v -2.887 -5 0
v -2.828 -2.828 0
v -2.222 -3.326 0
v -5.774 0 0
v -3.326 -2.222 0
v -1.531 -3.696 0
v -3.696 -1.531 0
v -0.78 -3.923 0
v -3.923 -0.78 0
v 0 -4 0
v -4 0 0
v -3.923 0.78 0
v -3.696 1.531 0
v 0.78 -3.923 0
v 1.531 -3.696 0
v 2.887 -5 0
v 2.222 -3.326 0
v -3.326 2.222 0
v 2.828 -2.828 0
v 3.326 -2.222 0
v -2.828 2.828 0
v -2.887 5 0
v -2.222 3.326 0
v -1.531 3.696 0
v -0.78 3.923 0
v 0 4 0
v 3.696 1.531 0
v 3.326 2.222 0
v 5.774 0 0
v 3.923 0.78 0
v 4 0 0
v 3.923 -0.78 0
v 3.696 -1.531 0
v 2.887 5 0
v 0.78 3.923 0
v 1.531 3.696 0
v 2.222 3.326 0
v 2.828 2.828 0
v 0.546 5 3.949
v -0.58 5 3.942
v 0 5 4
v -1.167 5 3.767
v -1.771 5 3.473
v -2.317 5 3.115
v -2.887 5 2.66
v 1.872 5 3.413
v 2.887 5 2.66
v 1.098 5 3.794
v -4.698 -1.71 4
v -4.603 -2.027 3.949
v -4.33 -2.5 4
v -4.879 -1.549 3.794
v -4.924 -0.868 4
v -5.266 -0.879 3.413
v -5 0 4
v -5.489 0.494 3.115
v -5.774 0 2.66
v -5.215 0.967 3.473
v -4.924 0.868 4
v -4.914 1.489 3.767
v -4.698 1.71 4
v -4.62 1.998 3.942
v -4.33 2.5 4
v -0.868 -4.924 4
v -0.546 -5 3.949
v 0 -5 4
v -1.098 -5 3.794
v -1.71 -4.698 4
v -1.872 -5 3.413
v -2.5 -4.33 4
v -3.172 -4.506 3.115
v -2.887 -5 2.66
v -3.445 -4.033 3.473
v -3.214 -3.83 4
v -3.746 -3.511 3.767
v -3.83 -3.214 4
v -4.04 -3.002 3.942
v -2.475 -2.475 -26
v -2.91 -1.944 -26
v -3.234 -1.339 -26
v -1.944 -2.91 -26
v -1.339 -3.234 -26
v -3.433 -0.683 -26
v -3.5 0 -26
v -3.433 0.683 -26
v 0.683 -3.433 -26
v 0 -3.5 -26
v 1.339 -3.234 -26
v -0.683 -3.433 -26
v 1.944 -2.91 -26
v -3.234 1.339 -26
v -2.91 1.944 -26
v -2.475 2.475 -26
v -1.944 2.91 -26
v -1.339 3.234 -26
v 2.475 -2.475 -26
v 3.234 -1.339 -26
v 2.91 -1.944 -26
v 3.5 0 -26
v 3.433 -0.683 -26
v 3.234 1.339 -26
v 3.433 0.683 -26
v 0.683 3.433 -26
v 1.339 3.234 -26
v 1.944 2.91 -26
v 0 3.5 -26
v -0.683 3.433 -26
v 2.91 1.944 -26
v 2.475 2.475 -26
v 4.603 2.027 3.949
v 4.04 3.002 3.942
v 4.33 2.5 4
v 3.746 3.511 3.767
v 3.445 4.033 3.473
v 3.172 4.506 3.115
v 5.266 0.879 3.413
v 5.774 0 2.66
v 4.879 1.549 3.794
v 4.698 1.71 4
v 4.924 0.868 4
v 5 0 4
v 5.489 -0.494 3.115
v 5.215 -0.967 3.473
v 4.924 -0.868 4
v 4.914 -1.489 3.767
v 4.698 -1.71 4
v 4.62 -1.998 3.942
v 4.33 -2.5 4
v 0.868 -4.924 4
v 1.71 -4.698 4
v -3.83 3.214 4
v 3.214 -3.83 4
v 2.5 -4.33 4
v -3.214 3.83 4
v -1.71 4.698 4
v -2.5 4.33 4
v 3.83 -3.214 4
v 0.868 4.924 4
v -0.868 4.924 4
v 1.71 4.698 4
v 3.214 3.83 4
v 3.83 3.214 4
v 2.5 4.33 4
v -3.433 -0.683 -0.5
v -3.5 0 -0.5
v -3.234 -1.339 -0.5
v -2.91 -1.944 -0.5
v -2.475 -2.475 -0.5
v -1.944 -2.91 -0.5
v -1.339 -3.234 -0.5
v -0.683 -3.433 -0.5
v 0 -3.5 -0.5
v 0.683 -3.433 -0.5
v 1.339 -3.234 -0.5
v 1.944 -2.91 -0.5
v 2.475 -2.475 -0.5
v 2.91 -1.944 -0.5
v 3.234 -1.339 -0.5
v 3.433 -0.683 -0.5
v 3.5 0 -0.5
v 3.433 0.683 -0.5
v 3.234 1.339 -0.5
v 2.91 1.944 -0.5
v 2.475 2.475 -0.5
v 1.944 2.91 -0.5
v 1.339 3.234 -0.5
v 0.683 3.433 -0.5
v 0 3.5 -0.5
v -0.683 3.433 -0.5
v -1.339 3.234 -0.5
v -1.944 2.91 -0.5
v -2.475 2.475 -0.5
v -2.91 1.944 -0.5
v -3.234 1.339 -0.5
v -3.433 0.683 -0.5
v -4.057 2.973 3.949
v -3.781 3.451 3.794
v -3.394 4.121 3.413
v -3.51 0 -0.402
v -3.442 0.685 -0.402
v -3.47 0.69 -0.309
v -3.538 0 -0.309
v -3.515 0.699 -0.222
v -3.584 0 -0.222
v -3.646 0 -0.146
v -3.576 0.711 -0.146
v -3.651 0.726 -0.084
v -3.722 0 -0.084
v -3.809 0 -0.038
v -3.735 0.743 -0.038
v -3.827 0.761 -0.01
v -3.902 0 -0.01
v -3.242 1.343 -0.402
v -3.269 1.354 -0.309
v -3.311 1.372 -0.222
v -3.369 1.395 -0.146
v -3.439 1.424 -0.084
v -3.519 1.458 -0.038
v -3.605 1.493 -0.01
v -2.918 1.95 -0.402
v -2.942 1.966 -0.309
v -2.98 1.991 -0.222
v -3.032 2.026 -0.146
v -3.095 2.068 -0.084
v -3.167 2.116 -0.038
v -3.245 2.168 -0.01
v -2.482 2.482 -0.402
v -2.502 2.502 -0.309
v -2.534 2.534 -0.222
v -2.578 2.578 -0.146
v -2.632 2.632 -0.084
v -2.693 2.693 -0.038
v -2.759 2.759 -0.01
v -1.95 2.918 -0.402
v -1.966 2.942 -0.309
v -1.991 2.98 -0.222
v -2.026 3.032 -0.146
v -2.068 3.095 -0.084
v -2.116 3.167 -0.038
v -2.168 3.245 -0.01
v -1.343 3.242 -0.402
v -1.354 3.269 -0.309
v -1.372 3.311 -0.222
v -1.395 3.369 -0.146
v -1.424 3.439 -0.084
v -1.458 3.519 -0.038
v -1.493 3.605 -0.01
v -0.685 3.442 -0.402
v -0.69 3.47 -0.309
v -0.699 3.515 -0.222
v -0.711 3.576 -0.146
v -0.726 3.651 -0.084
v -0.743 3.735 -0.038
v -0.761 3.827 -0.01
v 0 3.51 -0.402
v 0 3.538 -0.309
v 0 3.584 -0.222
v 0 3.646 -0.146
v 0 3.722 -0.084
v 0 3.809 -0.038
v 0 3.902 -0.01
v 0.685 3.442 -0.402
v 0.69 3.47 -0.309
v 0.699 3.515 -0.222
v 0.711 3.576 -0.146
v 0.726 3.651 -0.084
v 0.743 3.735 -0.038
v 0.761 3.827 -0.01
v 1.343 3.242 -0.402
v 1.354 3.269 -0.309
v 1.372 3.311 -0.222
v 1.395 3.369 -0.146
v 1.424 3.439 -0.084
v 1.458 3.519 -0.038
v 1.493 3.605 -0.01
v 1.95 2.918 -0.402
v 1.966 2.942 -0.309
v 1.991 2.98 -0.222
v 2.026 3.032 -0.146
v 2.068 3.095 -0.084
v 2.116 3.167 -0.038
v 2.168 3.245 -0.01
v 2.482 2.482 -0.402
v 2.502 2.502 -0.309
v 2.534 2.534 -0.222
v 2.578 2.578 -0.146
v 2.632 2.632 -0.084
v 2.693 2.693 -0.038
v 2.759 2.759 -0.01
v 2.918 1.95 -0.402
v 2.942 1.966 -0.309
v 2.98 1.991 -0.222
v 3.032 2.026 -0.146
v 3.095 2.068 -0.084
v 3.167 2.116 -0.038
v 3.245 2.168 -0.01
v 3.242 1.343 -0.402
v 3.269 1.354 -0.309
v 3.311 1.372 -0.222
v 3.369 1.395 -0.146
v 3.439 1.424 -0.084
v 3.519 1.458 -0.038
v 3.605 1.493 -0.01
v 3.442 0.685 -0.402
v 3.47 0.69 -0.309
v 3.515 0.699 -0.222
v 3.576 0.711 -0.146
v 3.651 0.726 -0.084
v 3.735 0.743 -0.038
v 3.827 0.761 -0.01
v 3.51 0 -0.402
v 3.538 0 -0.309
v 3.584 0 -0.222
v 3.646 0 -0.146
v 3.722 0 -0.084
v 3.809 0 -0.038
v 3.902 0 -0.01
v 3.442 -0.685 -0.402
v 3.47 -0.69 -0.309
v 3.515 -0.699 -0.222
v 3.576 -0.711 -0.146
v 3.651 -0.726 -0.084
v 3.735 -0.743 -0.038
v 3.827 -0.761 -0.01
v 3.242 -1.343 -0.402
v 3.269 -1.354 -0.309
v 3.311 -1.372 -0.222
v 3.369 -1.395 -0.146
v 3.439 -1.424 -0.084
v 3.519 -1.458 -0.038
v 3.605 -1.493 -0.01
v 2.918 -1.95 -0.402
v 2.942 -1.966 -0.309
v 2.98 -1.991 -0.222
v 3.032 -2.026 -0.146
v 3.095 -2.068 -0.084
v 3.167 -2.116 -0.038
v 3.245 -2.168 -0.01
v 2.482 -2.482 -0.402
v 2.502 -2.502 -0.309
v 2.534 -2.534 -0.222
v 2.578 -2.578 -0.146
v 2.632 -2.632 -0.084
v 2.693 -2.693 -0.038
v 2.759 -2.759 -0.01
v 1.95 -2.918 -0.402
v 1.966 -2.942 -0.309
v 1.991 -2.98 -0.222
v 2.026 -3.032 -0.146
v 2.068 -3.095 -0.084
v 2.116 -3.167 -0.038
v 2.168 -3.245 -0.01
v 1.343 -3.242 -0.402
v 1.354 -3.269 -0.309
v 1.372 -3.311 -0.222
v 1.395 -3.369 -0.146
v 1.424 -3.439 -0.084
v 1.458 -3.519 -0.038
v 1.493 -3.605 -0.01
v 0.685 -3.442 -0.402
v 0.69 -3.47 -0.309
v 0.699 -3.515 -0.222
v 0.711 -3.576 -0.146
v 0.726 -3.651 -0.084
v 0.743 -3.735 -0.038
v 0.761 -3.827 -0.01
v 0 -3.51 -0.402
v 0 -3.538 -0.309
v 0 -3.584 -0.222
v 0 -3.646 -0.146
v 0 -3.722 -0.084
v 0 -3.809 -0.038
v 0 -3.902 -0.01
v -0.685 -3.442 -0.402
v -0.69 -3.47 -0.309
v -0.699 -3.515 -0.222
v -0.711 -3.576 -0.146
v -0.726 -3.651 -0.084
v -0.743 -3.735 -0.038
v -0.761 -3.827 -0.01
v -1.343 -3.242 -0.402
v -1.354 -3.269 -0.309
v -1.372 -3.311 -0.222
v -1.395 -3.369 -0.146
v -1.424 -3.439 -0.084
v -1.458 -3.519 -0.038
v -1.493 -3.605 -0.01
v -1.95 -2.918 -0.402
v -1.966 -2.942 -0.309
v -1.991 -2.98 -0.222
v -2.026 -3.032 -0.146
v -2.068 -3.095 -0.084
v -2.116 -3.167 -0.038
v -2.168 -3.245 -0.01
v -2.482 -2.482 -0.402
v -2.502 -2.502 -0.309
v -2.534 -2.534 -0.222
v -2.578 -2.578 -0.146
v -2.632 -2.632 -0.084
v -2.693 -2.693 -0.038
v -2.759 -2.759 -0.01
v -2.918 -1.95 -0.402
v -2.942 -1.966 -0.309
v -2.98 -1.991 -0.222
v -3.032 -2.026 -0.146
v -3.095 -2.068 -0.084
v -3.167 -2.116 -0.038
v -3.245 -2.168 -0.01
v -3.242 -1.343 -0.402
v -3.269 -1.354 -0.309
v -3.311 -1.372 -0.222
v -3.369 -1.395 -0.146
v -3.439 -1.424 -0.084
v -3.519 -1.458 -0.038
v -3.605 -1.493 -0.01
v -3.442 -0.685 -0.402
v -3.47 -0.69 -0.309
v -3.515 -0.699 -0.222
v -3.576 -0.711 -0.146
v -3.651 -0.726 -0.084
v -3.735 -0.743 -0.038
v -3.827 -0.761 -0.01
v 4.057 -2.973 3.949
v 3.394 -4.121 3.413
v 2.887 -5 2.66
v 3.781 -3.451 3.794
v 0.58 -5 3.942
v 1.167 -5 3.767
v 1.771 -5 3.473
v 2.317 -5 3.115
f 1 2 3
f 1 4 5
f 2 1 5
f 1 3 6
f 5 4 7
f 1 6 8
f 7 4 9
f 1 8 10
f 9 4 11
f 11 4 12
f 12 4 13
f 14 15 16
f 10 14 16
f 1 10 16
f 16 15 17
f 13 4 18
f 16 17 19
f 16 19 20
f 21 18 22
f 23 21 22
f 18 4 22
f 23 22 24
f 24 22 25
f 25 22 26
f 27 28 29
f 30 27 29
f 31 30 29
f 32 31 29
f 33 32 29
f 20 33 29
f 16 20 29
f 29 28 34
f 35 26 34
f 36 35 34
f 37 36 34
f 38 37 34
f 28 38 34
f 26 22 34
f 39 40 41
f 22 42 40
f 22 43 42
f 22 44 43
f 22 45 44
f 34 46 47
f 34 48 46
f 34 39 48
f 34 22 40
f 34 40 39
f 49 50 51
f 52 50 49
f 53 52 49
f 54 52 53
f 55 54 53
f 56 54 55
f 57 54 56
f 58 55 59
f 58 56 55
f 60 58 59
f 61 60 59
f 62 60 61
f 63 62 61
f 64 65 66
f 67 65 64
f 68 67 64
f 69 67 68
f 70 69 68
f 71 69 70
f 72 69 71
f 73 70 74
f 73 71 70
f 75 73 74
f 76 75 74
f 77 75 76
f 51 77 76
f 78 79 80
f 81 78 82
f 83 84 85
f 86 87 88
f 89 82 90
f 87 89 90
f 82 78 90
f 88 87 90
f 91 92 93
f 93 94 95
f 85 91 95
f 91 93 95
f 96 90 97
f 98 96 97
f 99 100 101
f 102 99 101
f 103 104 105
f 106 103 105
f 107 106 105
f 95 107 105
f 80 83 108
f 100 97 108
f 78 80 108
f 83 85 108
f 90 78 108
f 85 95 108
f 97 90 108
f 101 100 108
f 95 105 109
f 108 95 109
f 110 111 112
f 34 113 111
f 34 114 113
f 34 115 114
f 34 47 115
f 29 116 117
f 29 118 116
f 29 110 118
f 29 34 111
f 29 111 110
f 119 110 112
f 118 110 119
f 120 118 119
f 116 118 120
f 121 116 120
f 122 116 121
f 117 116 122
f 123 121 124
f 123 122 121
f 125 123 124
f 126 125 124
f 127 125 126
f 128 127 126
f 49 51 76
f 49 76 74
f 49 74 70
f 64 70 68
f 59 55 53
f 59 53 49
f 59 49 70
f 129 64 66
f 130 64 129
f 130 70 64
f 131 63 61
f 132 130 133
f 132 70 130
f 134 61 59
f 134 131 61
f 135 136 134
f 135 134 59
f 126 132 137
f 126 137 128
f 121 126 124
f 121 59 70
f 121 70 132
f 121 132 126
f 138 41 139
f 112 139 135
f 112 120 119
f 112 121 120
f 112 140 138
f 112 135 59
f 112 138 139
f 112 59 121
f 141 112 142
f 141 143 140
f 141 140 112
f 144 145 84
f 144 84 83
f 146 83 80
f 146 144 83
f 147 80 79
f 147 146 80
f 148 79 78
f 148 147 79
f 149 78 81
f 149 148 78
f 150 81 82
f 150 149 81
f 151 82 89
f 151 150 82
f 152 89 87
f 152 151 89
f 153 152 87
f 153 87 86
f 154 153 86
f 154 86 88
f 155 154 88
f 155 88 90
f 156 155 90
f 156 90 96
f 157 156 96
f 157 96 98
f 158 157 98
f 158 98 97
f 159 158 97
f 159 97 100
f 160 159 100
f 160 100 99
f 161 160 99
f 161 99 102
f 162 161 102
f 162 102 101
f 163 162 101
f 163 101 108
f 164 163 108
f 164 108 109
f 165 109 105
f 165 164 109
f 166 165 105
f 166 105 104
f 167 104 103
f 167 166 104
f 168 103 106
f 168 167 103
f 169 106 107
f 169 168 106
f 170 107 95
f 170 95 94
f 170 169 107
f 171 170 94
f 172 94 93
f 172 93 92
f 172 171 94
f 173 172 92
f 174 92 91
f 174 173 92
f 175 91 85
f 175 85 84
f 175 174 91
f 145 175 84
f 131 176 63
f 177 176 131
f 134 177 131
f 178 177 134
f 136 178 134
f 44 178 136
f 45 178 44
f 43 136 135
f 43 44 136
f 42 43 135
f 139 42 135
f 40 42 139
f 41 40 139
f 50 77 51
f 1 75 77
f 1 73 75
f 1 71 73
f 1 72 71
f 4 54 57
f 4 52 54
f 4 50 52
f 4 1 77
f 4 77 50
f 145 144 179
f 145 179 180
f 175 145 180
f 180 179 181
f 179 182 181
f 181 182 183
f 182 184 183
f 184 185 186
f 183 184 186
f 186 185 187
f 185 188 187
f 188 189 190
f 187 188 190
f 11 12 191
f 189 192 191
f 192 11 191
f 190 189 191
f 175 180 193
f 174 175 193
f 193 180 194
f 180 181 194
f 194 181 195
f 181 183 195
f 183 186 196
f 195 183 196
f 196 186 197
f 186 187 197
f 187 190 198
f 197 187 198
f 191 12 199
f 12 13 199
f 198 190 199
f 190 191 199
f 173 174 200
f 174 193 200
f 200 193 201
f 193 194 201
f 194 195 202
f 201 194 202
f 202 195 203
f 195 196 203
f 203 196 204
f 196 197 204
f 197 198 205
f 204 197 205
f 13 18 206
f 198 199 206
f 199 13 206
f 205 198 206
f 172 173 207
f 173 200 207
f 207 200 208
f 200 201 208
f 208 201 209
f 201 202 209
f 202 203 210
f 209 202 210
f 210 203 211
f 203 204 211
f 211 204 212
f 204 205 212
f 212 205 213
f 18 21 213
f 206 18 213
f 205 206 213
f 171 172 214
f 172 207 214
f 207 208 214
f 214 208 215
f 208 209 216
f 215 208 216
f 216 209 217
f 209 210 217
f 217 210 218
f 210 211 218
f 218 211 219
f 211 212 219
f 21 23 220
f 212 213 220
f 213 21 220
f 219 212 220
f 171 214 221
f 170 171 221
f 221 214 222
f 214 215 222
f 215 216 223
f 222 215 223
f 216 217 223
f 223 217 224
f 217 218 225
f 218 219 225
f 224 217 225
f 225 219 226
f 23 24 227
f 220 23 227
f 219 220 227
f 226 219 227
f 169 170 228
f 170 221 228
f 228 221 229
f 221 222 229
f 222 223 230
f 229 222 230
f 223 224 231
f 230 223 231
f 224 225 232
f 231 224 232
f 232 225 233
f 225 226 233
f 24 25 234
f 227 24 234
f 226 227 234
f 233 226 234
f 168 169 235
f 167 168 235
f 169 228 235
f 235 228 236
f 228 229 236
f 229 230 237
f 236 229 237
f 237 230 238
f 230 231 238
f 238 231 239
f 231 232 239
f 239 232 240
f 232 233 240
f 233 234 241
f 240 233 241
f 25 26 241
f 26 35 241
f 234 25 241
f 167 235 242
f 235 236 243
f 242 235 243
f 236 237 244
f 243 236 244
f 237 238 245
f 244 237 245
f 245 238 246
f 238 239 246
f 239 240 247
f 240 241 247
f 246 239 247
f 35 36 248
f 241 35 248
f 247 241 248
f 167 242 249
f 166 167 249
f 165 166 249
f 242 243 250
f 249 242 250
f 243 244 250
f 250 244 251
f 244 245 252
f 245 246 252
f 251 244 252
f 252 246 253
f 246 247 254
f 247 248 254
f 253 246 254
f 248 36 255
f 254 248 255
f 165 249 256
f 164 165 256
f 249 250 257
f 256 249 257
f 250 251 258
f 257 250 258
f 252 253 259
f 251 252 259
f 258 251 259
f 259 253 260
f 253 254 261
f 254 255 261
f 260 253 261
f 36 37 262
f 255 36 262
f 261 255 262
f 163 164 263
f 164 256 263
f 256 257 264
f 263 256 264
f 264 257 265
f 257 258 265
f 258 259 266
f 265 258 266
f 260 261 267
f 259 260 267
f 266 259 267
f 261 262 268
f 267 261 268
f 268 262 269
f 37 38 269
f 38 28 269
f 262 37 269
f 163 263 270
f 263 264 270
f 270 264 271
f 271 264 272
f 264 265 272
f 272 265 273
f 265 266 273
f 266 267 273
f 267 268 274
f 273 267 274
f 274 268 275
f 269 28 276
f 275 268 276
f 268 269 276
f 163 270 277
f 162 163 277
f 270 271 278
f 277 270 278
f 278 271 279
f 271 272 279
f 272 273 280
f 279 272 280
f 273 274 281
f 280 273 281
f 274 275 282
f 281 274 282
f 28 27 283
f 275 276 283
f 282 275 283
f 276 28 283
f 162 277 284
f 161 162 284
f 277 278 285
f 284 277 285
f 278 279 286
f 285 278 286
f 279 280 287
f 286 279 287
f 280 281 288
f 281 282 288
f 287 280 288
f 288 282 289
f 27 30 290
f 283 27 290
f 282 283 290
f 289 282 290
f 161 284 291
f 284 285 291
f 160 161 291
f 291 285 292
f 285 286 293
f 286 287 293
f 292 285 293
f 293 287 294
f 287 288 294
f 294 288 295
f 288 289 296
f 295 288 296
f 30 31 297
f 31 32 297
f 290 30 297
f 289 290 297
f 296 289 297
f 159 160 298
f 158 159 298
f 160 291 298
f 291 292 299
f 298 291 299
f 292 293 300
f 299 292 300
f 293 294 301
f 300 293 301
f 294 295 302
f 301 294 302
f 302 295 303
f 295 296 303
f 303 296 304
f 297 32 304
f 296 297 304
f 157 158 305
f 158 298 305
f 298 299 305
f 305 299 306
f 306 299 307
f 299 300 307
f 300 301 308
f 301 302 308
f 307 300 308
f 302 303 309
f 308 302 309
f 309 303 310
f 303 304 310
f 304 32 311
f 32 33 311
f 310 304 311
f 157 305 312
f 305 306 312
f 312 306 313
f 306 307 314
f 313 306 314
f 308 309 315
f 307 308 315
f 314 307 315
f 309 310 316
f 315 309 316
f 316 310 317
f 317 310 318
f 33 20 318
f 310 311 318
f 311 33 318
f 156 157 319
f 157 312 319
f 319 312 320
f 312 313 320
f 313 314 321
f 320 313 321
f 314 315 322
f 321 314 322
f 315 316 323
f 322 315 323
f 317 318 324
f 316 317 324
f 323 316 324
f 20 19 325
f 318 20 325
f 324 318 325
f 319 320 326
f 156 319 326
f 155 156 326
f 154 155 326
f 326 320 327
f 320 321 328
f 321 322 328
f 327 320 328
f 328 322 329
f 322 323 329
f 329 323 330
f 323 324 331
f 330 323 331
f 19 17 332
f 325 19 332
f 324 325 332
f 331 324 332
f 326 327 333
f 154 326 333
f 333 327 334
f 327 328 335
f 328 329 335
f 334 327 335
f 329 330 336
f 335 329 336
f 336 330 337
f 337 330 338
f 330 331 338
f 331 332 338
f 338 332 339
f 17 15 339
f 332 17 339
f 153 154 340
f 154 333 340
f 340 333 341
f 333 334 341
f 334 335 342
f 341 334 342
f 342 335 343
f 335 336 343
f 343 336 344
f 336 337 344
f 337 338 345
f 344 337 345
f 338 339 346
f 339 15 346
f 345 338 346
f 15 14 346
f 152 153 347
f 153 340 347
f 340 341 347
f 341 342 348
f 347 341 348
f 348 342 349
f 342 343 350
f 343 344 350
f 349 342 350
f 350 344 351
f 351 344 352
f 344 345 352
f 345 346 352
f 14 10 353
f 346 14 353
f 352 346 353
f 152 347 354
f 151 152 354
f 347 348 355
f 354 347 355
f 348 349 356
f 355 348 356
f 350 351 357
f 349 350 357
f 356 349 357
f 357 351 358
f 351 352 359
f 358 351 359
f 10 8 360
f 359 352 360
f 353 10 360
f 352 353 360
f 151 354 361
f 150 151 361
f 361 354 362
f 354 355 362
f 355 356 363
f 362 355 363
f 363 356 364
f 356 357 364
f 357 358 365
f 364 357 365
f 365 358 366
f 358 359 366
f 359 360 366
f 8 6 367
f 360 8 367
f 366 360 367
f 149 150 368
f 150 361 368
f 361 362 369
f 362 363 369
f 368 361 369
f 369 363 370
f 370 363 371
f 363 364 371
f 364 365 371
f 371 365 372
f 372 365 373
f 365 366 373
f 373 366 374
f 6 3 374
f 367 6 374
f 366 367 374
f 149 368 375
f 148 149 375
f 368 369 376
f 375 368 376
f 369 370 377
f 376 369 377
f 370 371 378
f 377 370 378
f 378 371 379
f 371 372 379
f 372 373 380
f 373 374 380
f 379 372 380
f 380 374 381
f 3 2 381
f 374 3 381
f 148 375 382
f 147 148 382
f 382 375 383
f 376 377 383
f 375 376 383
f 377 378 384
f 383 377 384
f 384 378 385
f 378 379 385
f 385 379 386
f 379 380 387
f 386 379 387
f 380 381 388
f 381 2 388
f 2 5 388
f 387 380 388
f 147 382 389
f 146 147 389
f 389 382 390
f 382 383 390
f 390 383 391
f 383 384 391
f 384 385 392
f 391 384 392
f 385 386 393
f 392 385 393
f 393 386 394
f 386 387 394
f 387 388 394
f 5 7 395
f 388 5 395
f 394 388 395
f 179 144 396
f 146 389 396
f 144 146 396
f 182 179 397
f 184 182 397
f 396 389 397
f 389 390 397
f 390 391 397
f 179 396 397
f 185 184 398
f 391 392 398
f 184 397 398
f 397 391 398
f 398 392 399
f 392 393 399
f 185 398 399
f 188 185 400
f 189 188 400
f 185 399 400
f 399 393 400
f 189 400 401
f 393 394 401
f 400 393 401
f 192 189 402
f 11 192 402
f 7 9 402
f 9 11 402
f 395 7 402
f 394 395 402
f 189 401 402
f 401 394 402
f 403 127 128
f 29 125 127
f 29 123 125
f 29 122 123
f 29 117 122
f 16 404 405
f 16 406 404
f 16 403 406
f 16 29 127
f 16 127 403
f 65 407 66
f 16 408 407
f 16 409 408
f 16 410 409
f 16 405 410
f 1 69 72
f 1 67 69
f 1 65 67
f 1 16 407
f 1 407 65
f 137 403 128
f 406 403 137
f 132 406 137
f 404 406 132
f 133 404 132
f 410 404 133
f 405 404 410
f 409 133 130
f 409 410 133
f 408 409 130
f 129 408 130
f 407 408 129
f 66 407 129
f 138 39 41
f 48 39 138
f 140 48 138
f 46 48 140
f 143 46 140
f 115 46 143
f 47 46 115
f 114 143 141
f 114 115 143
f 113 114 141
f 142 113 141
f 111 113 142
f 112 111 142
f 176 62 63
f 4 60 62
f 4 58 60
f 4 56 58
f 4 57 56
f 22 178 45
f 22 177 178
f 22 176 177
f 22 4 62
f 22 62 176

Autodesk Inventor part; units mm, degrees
ref_plane "YZ Plane" through (0, 0, 0) normal (1, 0, 0) x (0, 1, 0)
ref_plane "XZ Plane" through (0, 0, 0) normal (0, 1, 0) x (-1, 0, 0)
ref_plane "XY Plane" through (0, 0, 0) normal (0, 0, 1) x (1, 0, 0)
sketch "Sketch1" plane through (0, 0, 0) normal (0, 0, 1) x (1, 0, 0)
  line L0 (2.8868, 5) -> (5.7735, 0)
  line L1 (5.7735, 0) -> (2.8868, -5)
  line L2 (2.8868, -5) -> (-2.8868, -5)
  line L3 (-2.8868, -5) -> (-5.7735, 0)
  line L4 (-5.7735, 0) -> (-2.8868, 5)
  line L5 (-2.8868, 5) -> (2.8868, 5)
  point P0 (0, 0)
  point P1 (0, 0)
  dimension "d0" = 10
extrude "Extrusion1" add sketch "Sketch1" along normal blind 4
sketch "Sketch2" plane through (0, 0, 0) normal (0, 0, -1) x (-1, 0, 0)
  circle A0 centre (0, 0) radius 3.5
  dimension "d3" = 7
extrude "Extrusion2" add sketch "Sketch2" along normal blind 30
thread "Thread1" size "M7x1" class "6g" standard "ANSI Metric M Profile" length 30 offset 1.5
fillet "Fillet1" radius 1 1 edges at (3.5, 0, -30)
fillet "Fillet2" radius 0.5 1 edges at (3.5, 0, 0)
sketch "Sketch4" plane through (0, 0, 4) normal (0, 0, 1) x (1, 0, 0)
  circle A0 centre (0, 0) radius 5
  line L0 (5.7735, 0) -> (2.8868, 5) projected
extrude "Extrusion4" cut sketch "Sketch4" against normal blind 30 draft 30 keep common part
properties part number "Bolt 1.0"
